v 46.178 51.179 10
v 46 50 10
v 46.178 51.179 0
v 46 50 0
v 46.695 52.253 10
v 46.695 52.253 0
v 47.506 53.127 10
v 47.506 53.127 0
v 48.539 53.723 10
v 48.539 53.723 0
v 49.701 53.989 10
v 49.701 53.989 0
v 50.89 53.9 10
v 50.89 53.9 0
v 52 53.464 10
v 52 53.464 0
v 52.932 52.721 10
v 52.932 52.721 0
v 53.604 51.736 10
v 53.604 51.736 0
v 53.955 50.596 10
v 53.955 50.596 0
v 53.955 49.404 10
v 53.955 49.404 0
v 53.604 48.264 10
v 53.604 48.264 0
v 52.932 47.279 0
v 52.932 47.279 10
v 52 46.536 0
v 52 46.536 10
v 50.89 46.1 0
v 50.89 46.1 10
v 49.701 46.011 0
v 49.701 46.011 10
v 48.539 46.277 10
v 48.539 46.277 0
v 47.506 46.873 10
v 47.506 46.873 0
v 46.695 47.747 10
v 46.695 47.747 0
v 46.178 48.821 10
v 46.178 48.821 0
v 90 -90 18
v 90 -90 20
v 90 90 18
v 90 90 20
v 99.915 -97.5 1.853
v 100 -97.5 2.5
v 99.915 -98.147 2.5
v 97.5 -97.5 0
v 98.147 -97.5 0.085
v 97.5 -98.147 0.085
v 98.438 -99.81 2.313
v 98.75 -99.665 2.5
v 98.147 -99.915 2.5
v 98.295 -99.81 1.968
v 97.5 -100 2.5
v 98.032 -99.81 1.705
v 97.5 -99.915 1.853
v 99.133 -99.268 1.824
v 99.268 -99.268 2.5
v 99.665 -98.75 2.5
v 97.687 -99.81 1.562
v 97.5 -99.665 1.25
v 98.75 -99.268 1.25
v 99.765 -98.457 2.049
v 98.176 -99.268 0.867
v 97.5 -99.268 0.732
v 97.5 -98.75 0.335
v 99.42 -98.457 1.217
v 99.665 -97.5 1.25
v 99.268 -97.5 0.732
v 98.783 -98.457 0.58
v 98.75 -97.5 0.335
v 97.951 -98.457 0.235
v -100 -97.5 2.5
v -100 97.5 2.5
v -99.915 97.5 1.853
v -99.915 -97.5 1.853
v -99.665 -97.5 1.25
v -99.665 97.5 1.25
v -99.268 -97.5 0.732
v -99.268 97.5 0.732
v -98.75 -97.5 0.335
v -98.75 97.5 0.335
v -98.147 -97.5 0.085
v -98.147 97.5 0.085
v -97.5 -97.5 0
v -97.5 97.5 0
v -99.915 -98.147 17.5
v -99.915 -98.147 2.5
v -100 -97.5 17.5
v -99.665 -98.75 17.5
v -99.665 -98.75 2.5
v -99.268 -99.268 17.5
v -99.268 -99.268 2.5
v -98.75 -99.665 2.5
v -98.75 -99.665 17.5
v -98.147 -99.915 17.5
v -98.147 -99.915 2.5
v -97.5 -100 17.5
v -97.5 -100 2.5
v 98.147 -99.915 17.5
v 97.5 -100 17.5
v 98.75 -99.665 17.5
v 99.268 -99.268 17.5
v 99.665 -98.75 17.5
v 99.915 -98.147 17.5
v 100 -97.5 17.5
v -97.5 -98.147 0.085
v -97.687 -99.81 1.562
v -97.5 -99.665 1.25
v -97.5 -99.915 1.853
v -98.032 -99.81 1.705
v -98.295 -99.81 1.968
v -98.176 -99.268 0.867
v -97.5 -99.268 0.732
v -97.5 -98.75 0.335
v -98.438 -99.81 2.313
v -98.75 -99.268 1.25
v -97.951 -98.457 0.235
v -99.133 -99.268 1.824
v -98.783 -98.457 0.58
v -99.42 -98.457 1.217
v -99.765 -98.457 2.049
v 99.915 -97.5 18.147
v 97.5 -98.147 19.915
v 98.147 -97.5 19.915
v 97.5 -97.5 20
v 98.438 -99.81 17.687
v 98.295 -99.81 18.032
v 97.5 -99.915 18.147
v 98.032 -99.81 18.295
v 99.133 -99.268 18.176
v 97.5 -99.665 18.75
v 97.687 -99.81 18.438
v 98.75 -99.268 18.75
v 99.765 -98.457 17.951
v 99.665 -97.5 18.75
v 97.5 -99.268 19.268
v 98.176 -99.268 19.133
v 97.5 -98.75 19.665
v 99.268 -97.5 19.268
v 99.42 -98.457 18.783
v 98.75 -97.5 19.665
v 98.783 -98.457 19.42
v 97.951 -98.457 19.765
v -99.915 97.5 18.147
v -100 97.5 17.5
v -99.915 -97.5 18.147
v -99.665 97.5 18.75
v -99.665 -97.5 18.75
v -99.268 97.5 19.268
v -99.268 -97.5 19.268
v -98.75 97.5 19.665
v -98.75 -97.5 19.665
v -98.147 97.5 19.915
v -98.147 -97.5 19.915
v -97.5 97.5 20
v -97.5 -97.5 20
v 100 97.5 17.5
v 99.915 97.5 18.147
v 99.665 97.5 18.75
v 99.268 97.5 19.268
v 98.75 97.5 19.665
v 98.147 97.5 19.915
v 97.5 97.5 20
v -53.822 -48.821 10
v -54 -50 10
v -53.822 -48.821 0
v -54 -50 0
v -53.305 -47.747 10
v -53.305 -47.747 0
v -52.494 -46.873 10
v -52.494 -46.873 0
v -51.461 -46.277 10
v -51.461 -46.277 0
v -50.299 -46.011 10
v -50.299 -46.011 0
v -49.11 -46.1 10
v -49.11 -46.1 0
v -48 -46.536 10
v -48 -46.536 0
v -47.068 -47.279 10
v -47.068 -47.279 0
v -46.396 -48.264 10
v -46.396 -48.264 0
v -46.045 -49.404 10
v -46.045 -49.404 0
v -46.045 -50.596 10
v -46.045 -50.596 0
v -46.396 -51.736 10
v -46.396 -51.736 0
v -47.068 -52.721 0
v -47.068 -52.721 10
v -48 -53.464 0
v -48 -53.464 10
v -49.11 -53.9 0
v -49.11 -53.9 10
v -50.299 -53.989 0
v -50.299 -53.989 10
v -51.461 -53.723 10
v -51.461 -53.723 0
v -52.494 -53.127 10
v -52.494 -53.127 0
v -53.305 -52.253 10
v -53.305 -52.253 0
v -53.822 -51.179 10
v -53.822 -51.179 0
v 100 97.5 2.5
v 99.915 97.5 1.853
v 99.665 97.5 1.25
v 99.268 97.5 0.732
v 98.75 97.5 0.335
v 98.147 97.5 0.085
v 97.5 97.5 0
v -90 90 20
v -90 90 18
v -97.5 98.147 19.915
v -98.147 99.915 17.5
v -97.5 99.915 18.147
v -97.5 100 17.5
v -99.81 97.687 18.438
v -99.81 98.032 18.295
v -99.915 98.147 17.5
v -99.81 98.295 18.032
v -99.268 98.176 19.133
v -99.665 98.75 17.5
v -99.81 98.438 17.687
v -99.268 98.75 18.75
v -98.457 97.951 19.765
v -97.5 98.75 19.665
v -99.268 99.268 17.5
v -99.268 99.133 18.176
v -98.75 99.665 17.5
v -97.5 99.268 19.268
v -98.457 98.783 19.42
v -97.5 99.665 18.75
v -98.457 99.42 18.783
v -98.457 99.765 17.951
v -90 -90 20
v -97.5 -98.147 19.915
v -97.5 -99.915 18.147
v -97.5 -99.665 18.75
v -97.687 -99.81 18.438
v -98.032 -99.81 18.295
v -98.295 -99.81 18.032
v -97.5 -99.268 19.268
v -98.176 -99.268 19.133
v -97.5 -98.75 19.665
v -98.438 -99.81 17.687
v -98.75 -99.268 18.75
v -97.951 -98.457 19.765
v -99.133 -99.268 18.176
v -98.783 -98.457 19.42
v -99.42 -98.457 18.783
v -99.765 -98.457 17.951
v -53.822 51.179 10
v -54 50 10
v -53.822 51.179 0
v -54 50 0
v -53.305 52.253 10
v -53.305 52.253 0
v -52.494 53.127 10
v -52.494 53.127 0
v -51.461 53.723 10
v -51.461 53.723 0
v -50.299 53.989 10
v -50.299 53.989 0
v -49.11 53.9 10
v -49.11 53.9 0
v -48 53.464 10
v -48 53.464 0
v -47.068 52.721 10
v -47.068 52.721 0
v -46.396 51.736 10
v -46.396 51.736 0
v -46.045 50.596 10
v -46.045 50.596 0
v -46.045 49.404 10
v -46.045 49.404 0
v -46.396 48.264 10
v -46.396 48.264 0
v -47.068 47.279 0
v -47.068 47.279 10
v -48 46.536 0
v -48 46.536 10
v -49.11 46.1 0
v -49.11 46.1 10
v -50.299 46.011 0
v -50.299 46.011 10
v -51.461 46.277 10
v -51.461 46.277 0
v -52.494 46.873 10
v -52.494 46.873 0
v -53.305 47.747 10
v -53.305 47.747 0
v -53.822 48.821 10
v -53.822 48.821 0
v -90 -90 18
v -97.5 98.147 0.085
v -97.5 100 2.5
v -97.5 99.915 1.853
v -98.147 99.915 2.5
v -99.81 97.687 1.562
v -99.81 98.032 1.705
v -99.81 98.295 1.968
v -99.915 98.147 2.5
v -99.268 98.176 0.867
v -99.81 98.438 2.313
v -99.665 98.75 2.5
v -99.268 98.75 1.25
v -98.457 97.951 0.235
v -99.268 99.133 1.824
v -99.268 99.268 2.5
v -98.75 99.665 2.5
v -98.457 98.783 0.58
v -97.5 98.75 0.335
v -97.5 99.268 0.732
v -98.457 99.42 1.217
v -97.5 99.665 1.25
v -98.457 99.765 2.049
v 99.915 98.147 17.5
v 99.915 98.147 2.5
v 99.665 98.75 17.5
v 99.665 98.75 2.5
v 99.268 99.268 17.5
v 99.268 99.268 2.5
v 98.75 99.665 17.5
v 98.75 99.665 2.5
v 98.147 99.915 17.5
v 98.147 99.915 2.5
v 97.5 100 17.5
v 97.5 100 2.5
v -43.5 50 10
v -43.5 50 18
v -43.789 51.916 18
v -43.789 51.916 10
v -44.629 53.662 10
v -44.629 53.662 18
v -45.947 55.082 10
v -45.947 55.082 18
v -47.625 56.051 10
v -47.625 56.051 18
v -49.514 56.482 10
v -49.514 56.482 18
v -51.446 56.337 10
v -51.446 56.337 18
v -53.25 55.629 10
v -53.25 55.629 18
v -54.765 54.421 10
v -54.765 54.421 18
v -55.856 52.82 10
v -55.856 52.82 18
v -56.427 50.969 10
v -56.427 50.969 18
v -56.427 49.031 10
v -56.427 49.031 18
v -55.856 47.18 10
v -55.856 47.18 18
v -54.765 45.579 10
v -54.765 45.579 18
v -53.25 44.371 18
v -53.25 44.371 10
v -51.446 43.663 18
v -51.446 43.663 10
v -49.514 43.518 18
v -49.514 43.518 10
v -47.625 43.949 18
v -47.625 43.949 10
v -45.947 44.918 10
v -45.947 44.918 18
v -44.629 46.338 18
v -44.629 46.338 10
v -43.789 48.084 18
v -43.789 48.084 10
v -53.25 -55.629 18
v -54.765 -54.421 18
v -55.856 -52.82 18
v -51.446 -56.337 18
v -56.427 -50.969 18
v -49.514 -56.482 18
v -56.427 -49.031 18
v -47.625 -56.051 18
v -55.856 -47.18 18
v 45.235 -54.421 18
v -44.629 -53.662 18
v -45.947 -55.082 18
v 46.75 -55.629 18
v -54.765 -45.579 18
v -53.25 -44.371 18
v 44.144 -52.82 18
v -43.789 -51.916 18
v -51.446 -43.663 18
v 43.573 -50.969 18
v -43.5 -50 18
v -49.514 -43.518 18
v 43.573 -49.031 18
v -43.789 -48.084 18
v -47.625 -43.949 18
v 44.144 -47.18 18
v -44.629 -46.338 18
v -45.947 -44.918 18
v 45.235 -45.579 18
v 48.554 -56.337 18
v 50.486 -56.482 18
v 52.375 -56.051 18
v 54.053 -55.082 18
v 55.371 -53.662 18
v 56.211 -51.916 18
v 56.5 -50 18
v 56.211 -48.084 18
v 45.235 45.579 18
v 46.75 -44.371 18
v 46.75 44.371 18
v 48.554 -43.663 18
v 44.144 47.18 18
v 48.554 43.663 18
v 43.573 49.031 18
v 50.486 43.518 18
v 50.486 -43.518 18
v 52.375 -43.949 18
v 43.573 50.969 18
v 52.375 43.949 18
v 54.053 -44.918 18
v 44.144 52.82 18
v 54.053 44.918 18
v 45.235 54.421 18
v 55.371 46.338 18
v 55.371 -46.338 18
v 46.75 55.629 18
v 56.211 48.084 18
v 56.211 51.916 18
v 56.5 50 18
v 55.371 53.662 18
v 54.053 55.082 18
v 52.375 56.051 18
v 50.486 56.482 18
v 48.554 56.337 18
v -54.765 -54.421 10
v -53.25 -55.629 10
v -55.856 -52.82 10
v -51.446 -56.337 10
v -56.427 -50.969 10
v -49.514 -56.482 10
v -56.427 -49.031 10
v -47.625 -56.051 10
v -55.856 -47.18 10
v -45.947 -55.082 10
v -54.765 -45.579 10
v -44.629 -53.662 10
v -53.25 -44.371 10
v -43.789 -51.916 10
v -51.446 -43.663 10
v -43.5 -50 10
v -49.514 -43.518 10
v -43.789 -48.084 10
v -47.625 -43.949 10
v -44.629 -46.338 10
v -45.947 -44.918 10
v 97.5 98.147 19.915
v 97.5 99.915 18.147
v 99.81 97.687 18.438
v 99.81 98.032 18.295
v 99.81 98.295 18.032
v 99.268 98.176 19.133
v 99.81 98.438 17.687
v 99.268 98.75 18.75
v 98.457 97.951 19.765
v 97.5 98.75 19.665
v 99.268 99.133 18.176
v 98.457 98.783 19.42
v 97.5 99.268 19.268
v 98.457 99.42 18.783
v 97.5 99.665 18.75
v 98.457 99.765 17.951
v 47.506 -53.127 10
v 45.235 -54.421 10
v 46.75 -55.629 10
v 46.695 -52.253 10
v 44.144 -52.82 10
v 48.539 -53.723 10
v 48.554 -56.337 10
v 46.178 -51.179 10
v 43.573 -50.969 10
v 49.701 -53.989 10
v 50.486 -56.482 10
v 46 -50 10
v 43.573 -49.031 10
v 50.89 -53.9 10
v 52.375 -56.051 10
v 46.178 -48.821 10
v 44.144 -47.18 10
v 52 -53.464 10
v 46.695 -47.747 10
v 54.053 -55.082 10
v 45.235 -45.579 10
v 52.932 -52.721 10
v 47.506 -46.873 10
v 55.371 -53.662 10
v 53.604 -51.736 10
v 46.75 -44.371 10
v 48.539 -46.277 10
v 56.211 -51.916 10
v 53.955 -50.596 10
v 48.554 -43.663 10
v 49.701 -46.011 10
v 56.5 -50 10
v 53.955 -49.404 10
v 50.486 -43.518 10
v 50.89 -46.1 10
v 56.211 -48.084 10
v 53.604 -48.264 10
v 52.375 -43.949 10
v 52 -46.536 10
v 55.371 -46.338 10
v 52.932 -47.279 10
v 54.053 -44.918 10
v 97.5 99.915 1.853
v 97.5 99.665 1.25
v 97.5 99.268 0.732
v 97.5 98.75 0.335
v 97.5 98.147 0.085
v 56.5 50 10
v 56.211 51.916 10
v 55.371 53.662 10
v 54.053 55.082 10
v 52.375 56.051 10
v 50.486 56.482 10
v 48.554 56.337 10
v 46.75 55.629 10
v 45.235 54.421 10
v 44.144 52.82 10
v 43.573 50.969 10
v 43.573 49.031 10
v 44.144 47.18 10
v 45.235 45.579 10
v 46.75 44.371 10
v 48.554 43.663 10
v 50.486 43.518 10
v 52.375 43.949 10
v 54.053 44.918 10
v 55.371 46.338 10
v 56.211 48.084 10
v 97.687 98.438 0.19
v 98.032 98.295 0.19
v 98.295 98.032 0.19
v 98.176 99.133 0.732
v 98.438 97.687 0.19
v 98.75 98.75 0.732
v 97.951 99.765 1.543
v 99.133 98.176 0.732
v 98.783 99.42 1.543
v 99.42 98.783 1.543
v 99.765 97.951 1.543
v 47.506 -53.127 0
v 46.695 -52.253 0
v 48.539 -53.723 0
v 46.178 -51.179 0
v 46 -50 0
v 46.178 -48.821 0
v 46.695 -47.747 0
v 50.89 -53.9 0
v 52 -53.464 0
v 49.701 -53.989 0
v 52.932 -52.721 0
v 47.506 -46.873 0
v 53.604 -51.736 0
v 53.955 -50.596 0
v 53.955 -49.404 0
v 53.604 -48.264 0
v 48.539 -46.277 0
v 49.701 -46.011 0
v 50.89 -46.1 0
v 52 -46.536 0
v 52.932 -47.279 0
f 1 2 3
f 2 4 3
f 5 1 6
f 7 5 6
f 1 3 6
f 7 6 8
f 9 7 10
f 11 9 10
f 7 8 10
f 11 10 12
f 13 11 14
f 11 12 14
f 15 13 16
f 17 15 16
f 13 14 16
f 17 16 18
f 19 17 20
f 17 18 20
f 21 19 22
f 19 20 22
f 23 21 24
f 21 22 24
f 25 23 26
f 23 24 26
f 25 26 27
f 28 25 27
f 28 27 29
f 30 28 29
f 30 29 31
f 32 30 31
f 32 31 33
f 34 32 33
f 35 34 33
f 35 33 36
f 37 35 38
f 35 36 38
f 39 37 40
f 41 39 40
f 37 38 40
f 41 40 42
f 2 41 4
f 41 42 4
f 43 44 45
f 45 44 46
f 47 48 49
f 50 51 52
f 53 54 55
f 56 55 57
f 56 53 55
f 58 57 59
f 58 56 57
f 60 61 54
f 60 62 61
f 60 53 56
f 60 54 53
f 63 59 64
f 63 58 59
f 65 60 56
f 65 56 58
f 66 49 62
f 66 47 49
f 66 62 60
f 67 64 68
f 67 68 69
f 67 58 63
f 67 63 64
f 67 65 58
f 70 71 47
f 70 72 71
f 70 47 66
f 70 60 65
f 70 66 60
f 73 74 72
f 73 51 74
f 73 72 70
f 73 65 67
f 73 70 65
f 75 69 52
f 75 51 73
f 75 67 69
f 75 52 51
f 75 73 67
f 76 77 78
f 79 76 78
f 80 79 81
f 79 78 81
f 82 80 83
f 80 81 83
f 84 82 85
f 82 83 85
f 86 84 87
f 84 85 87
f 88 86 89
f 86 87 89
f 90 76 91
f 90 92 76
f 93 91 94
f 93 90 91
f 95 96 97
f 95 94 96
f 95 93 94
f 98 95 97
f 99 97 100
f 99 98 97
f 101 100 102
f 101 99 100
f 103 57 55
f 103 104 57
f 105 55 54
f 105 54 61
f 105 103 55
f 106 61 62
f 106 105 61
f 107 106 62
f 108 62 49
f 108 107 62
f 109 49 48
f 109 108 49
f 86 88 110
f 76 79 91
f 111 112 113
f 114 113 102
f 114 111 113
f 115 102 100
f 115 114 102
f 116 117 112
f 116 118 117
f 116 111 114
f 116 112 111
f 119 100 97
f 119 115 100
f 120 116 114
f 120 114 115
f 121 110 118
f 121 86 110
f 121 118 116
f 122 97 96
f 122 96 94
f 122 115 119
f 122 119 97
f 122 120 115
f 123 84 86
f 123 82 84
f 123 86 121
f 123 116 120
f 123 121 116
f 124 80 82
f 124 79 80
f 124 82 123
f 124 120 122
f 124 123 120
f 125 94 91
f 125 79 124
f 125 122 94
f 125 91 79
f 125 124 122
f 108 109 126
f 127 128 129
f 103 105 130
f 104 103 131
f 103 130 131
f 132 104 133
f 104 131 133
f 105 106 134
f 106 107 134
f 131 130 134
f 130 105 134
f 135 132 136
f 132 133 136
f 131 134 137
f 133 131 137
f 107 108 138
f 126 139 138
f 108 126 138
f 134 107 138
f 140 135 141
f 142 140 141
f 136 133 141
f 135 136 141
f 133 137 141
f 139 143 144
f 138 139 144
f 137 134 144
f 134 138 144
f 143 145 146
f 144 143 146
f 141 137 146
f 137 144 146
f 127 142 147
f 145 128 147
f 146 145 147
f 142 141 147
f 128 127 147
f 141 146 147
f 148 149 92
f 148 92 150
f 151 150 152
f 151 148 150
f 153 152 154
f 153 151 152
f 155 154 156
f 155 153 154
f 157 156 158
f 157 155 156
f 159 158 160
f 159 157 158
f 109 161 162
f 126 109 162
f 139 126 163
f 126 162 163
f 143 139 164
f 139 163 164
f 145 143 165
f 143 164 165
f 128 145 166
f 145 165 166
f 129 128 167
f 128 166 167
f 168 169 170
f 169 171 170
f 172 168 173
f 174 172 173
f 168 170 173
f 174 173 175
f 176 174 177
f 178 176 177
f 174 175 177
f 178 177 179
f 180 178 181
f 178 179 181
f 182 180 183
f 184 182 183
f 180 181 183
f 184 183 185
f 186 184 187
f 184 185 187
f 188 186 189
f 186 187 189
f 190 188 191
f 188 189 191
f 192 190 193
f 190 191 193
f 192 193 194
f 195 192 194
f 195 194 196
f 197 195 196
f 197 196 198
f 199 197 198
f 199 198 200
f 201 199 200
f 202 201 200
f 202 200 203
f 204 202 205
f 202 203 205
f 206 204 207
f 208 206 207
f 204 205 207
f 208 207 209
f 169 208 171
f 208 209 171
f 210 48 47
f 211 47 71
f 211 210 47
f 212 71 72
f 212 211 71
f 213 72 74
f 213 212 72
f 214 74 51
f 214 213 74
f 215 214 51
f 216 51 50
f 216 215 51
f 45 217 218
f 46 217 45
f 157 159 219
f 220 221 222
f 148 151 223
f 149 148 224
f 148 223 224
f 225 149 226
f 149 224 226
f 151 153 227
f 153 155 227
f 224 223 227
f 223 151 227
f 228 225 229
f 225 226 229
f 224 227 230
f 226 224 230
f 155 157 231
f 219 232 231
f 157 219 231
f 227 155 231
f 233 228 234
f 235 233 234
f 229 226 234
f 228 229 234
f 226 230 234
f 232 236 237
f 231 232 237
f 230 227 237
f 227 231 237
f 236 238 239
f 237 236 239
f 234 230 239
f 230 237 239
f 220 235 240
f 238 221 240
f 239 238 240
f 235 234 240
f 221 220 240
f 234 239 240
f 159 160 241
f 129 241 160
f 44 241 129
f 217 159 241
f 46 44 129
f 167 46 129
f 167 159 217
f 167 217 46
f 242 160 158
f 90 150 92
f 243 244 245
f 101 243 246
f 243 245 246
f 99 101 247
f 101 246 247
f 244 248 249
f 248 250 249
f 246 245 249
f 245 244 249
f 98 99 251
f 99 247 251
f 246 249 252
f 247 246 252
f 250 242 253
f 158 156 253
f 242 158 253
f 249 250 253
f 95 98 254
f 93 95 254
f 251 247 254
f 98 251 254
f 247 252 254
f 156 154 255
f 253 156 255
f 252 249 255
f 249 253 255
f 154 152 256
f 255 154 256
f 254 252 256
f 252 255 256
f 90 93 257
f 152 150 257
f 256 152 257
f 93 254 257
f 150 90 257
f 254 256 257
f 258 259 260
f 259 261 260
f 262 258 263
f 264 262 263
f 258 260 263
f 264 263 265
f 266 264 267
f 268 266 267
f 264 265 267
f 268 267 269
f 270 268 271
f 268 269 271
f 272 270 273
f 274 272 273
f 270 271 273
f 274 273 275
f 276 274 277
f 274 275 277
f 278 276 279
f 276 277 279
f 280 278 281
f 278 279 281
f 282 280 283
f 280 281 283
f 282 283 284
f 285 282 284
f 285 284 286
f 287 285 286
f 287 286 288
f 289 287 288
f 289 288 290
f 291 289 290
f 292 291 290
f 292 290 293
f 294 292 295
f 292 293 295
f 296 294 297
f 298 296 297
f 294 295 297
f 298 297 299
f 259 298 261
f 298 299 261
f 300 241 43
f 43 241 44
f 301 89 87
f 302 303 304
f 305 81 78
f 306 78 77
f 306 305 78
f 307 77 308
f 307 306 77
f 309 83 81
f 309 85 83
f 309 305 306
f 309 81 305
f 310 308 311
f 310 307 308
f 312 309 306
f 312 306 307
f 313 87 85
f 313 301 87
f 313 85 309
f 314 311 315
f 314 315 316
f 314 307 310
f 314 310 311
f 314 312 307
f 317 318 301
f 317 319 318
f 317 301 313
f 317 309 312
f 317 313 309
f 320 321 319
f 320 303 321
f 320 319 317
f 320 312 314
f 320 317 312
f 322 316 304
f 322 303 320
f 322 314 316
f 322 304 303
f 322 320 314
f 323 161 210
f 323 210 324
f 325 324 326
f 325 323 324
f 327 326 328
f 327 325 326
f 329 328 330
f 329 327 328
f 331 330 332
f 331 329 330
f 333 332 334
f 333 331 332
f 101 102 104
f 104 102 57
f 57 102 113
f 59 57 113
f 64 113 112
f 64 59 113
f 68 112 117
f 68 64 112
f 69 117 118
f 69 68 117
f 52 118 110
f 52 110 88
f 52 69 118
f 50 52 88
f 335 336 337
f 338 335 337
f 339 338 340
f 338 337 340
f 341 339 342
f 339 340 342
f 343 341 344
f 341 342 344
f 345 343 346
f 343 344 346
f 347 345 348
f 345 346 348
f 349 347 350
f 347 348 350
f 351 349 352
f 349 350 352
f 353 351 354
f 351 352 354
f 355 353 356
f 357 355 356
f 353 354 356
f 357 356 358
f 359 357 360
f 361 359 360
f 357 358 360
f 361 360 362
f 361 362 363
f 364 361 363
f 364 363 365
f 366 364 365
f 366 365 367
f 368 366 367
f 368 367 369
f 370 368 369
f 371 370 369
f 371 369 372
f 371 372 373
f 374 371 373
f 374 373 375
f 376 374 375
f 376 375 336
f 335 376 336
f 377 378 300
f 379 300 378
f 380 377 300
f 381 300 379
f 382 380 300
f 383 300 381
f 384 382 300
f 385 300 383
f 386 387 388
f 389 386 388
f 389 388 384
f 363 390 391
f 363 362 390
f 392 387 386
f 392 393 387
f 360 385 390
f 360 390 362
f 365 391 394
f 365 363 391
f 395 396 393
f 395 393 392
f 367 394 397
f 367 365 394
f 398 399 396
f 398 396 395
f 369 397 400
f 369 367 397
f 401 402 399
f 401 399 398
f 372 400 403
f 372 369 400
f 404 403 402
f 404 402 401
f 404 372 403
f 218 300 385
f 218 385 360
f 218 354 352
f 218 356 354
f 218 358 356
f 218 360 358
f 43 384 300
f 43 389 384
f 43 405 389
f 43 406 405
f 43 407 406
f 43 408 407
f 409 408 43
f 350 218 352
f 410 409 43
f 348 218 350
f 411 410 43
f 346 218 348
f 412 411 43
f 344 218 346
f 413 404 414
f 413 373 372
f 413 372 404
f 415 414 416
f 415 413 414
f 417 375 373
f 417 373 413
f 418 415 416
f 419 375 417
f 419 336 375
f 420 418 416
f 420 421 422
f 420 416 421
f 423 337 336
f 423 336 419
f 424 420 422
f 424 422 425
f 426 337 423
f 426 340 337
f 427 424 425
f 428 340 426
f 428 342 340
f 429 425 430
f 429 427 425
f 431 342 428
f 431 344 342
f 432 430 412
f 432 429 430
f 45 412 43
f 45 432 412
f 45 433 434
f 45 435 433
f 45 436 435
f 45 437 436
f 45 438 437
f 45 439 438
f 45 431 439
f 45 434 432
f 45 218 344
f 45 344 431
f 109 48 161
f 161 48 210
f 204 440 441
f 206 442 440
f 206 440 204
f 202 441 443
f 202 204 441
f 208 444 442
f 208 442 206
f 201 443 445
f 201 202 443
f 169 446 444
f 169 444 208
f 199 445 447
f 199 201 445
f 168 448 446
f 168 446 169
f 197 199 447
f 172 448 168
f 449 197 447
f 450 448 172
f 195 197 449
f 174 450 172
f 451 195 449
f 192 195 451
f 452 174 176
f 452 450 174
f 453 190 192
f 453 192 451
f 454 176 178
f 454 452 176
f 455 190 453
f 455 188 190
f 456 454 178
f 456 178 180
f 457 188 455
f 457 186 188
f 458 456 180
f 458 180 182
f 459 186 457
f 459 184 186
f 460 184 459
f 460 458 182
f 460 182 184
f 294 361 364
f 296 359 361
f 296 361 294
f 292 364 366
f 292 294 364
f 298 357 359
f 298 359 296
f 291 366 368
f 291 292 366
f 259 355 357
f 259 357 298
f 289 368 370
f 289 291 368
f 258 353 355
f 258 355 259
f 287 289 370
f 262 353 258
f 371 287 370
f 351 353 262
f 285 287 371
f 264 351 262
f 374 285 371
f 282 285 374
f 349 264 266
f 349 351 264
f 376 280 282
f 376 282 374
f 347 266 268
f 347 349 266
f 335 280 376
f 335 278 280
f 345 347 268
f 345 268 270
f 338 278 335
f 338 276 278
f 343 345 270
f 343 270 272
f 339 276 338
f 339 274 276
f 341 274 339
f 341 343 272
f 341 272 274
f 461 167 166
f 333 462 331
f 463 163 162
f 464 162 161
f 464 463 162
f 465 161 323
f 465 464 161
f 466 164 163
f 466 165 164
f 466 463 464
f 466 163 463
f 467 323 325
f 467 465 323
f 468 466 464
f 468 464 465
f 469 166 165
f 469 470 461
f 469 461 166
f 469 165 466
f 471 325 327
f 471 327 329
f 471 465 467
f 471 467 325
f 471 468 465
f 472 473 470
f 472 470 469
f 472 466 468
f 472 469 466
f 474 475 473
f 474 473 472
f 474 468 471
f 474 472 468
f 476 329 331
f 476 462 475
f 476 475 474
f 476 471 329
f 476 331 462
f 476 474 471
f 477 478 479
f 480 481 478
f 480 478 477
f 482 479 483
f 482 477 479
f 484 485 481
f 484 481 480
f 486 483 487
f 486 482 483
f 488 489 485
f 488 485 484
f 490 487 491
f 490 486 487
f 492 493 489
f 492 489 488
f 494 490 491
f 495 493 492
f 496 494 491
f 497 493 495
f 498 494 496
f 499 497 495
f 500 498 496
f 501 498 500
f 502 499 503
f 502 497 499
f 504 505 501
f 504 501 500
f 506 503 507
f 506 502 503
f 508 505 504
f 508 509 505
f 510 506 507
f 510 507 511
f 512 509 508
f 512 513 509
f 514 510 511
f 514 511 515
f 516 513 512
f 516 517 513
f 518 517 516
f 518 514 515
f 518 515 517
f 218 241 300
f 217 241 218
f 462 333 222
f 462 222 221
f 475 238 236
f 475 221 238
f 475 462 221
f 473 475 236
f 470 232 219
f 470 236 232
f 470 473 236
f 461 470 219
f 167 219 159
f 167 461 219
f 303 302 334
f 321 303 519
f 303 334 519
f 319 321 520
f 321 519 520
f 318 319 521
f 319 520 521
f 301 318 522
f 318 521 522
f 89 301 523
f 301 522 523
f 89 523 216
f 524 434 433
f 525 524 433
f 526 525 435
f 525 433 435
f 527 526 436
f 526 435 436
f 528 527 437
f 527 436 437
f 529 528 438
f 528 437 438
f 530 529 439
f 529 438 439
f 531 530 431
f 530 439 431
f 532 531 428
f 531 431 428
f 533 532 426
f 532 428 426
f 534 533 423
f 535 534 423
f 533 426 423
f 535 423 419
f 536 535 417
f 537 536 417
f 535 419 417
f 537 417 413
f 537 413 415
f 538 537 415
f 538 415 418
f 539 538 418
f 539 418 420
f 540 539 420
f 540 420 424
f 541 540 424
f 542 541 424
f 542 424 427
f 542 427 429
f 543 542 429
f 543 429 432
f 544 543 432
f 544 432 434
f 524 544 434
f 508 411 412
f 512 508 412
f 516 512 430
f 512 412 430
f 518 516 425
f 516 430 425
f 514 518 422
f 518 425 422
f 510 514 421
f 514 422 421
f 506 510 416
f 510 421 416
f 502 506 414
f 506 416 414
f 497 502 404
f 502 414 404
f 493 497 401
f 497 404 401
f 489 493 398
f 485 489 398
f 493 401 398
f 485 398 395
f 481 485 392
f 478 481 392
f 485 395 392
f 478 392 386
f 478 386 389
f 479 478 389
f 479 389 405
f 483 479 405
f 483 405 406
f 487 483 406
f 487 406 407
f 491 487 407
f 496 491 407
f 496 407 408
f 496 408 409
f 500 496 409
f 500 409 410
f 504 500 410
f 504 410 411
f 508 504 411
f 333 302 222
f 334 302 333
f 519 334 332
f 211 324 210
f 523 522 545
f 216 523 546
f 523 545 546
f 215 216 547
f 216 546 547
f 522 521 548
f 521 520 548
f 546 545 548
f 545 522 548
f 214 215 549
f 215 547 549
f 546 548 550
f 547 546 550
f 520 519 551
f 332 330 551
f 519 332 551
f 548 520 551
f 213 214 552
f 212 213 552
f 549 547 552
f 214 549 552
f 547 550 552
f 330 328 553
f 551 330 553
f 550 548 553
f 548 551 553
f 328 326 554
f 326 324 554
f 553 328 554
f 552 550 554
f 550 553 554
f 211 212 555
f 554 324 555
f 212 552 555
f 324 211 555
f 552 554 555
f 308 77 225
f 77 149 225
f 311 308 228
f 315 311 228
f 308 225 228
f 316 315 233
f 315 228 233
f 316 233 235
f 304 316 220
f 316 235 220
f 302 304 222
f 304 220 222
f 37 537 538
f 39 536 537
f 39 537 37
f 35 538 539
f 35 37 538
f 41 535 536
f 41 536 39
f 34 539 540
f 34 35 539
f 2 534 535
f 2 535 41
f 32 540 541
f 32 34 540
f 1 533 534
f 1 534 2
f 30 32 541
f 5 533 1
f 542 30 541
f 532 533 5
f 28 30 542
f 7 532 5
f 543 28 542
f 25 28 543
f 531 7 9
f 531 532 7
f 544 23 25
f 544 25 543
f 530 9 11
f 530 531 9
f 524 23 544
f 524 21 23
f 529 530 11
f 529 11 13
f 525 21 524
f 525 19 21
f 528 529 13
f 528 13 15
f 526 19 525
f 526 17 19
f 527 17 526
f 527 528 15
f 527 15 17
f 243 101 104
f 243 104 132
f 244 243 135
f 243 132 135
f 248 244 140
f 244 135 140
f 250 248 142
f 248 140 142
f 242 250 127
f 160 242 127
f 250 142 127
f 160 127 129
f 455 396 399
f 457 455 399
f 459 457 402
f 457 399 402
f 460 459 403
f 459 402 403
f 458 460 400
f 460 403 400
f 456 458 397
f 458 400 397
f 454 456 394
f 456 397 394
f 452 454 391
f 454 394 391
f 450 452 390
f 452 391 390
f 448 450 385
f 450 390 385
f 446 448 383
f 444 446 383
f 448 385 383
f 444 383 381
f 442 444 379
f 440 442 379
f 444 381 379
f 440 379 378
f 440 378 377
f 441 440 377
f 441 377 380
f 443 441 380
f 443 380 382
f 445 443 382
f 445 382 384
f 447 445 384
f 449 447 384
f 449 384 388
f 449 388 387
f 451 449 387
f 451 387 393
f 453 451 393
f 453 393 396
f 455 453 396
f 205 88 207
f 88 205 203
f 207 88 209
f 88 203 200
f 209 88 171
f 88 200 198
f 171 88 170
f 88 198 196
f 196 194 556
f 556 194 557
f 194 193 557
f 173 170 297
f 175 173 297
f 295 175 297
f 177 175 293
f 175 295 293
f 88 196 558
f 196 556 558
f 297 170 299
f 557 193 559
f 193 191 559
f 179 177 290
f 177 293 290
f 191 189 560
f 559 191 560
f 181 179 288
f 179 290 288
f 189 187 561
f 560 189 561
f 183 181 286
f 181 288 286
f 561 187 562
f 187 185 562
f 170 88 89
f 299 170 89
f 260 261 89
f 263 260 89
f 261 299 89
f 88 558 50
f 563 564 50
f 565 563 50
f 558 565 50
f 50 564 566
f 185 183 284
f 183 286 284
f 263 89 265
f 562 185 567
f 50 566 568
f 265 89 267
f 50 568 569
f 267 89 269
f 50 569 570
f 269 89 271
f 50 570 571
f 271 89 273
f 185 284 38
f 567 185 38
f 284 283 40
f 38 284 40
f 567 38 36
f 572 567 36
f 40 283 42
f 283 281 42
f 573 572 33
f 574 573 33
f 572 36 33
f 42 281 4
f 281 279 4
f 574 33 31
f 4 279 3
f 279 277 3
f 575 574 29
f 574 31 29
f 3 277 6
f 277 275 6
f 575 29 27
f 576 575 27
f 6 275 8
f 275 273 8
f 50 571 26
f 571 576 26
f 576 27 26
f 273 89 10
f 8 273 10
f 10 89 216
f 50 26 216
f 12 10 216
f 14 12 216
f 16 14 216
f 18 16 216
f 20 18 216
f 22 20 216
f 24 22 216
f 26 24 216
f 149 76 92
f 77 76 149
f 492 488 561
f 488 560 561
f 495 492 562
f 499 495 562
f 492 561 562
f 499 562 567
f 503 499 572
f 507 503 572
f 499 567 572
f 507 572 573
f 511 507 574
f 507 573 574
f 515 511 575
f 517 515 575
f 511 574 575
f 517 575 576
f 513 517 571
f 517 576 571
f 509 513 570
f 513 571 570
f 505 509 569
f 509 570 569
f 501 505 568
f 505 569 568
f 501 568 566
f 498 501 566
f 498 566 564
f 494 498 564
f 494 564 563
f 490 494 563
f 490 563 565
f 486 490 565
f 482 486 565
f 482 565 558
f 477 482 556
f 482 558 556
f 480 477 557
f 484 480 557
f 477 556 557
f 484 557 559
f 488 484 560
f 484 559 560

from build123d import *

# Parameters (mm, degrees)
F0_W           = 200
F0_H           = 200
F1_DEPTH       = 20
F2_R           = 2.5
F3_W           = 180
F3_H           = 180
F4_DEPTH       = 2
F6_D           = 8
F6_CBORE_D     = 13
F6_CBORE_DEPTH = 8


with BuildPart() as f1:
    # F0 (on Top) → F1 (new body)
    with BuildSketch(Plane.XY):
        Rectangle(F0_W, F0_H)
    extrude(amount=F1_DEPTH)

    # F2
    f2_edges = [f1.edges().sort_by_distance(p)[0] for p in [
        (0, 100, 20),
        (100, 0, 20),
        (100, 100, 10),
        (0, 100, 0),
        (100, 0, 0),
        (-100, 0, 0),
        (-100, 0, 20),
        (-100, 100, 10),
        (100, -100, 10),
        (0, -100, 20),
        (0, -100, 0),
        (-100, -100, 10),
    ]]
    fillet(f2_edges, radius=F2_R)

    # F3 (on face) → F4 (cut)
    with BuildSketch(Plane.XY.offset(20)):
        Rectangle(F3_W, F3_H)
    extrude(amount=-F4_DEPTH, mode=Mode.SUBTRACT)

    # F6 (through all)
    with Locations(Plane.XY.offset(18)):
        with Locations((-50, 50), (50, 50), (50, -50), (-50, -50)):
            CounterBoreHole(F6_D / 2, F6_CBORE_D / 2, F6_CBORE_DEPTH)


solid = f1.part
